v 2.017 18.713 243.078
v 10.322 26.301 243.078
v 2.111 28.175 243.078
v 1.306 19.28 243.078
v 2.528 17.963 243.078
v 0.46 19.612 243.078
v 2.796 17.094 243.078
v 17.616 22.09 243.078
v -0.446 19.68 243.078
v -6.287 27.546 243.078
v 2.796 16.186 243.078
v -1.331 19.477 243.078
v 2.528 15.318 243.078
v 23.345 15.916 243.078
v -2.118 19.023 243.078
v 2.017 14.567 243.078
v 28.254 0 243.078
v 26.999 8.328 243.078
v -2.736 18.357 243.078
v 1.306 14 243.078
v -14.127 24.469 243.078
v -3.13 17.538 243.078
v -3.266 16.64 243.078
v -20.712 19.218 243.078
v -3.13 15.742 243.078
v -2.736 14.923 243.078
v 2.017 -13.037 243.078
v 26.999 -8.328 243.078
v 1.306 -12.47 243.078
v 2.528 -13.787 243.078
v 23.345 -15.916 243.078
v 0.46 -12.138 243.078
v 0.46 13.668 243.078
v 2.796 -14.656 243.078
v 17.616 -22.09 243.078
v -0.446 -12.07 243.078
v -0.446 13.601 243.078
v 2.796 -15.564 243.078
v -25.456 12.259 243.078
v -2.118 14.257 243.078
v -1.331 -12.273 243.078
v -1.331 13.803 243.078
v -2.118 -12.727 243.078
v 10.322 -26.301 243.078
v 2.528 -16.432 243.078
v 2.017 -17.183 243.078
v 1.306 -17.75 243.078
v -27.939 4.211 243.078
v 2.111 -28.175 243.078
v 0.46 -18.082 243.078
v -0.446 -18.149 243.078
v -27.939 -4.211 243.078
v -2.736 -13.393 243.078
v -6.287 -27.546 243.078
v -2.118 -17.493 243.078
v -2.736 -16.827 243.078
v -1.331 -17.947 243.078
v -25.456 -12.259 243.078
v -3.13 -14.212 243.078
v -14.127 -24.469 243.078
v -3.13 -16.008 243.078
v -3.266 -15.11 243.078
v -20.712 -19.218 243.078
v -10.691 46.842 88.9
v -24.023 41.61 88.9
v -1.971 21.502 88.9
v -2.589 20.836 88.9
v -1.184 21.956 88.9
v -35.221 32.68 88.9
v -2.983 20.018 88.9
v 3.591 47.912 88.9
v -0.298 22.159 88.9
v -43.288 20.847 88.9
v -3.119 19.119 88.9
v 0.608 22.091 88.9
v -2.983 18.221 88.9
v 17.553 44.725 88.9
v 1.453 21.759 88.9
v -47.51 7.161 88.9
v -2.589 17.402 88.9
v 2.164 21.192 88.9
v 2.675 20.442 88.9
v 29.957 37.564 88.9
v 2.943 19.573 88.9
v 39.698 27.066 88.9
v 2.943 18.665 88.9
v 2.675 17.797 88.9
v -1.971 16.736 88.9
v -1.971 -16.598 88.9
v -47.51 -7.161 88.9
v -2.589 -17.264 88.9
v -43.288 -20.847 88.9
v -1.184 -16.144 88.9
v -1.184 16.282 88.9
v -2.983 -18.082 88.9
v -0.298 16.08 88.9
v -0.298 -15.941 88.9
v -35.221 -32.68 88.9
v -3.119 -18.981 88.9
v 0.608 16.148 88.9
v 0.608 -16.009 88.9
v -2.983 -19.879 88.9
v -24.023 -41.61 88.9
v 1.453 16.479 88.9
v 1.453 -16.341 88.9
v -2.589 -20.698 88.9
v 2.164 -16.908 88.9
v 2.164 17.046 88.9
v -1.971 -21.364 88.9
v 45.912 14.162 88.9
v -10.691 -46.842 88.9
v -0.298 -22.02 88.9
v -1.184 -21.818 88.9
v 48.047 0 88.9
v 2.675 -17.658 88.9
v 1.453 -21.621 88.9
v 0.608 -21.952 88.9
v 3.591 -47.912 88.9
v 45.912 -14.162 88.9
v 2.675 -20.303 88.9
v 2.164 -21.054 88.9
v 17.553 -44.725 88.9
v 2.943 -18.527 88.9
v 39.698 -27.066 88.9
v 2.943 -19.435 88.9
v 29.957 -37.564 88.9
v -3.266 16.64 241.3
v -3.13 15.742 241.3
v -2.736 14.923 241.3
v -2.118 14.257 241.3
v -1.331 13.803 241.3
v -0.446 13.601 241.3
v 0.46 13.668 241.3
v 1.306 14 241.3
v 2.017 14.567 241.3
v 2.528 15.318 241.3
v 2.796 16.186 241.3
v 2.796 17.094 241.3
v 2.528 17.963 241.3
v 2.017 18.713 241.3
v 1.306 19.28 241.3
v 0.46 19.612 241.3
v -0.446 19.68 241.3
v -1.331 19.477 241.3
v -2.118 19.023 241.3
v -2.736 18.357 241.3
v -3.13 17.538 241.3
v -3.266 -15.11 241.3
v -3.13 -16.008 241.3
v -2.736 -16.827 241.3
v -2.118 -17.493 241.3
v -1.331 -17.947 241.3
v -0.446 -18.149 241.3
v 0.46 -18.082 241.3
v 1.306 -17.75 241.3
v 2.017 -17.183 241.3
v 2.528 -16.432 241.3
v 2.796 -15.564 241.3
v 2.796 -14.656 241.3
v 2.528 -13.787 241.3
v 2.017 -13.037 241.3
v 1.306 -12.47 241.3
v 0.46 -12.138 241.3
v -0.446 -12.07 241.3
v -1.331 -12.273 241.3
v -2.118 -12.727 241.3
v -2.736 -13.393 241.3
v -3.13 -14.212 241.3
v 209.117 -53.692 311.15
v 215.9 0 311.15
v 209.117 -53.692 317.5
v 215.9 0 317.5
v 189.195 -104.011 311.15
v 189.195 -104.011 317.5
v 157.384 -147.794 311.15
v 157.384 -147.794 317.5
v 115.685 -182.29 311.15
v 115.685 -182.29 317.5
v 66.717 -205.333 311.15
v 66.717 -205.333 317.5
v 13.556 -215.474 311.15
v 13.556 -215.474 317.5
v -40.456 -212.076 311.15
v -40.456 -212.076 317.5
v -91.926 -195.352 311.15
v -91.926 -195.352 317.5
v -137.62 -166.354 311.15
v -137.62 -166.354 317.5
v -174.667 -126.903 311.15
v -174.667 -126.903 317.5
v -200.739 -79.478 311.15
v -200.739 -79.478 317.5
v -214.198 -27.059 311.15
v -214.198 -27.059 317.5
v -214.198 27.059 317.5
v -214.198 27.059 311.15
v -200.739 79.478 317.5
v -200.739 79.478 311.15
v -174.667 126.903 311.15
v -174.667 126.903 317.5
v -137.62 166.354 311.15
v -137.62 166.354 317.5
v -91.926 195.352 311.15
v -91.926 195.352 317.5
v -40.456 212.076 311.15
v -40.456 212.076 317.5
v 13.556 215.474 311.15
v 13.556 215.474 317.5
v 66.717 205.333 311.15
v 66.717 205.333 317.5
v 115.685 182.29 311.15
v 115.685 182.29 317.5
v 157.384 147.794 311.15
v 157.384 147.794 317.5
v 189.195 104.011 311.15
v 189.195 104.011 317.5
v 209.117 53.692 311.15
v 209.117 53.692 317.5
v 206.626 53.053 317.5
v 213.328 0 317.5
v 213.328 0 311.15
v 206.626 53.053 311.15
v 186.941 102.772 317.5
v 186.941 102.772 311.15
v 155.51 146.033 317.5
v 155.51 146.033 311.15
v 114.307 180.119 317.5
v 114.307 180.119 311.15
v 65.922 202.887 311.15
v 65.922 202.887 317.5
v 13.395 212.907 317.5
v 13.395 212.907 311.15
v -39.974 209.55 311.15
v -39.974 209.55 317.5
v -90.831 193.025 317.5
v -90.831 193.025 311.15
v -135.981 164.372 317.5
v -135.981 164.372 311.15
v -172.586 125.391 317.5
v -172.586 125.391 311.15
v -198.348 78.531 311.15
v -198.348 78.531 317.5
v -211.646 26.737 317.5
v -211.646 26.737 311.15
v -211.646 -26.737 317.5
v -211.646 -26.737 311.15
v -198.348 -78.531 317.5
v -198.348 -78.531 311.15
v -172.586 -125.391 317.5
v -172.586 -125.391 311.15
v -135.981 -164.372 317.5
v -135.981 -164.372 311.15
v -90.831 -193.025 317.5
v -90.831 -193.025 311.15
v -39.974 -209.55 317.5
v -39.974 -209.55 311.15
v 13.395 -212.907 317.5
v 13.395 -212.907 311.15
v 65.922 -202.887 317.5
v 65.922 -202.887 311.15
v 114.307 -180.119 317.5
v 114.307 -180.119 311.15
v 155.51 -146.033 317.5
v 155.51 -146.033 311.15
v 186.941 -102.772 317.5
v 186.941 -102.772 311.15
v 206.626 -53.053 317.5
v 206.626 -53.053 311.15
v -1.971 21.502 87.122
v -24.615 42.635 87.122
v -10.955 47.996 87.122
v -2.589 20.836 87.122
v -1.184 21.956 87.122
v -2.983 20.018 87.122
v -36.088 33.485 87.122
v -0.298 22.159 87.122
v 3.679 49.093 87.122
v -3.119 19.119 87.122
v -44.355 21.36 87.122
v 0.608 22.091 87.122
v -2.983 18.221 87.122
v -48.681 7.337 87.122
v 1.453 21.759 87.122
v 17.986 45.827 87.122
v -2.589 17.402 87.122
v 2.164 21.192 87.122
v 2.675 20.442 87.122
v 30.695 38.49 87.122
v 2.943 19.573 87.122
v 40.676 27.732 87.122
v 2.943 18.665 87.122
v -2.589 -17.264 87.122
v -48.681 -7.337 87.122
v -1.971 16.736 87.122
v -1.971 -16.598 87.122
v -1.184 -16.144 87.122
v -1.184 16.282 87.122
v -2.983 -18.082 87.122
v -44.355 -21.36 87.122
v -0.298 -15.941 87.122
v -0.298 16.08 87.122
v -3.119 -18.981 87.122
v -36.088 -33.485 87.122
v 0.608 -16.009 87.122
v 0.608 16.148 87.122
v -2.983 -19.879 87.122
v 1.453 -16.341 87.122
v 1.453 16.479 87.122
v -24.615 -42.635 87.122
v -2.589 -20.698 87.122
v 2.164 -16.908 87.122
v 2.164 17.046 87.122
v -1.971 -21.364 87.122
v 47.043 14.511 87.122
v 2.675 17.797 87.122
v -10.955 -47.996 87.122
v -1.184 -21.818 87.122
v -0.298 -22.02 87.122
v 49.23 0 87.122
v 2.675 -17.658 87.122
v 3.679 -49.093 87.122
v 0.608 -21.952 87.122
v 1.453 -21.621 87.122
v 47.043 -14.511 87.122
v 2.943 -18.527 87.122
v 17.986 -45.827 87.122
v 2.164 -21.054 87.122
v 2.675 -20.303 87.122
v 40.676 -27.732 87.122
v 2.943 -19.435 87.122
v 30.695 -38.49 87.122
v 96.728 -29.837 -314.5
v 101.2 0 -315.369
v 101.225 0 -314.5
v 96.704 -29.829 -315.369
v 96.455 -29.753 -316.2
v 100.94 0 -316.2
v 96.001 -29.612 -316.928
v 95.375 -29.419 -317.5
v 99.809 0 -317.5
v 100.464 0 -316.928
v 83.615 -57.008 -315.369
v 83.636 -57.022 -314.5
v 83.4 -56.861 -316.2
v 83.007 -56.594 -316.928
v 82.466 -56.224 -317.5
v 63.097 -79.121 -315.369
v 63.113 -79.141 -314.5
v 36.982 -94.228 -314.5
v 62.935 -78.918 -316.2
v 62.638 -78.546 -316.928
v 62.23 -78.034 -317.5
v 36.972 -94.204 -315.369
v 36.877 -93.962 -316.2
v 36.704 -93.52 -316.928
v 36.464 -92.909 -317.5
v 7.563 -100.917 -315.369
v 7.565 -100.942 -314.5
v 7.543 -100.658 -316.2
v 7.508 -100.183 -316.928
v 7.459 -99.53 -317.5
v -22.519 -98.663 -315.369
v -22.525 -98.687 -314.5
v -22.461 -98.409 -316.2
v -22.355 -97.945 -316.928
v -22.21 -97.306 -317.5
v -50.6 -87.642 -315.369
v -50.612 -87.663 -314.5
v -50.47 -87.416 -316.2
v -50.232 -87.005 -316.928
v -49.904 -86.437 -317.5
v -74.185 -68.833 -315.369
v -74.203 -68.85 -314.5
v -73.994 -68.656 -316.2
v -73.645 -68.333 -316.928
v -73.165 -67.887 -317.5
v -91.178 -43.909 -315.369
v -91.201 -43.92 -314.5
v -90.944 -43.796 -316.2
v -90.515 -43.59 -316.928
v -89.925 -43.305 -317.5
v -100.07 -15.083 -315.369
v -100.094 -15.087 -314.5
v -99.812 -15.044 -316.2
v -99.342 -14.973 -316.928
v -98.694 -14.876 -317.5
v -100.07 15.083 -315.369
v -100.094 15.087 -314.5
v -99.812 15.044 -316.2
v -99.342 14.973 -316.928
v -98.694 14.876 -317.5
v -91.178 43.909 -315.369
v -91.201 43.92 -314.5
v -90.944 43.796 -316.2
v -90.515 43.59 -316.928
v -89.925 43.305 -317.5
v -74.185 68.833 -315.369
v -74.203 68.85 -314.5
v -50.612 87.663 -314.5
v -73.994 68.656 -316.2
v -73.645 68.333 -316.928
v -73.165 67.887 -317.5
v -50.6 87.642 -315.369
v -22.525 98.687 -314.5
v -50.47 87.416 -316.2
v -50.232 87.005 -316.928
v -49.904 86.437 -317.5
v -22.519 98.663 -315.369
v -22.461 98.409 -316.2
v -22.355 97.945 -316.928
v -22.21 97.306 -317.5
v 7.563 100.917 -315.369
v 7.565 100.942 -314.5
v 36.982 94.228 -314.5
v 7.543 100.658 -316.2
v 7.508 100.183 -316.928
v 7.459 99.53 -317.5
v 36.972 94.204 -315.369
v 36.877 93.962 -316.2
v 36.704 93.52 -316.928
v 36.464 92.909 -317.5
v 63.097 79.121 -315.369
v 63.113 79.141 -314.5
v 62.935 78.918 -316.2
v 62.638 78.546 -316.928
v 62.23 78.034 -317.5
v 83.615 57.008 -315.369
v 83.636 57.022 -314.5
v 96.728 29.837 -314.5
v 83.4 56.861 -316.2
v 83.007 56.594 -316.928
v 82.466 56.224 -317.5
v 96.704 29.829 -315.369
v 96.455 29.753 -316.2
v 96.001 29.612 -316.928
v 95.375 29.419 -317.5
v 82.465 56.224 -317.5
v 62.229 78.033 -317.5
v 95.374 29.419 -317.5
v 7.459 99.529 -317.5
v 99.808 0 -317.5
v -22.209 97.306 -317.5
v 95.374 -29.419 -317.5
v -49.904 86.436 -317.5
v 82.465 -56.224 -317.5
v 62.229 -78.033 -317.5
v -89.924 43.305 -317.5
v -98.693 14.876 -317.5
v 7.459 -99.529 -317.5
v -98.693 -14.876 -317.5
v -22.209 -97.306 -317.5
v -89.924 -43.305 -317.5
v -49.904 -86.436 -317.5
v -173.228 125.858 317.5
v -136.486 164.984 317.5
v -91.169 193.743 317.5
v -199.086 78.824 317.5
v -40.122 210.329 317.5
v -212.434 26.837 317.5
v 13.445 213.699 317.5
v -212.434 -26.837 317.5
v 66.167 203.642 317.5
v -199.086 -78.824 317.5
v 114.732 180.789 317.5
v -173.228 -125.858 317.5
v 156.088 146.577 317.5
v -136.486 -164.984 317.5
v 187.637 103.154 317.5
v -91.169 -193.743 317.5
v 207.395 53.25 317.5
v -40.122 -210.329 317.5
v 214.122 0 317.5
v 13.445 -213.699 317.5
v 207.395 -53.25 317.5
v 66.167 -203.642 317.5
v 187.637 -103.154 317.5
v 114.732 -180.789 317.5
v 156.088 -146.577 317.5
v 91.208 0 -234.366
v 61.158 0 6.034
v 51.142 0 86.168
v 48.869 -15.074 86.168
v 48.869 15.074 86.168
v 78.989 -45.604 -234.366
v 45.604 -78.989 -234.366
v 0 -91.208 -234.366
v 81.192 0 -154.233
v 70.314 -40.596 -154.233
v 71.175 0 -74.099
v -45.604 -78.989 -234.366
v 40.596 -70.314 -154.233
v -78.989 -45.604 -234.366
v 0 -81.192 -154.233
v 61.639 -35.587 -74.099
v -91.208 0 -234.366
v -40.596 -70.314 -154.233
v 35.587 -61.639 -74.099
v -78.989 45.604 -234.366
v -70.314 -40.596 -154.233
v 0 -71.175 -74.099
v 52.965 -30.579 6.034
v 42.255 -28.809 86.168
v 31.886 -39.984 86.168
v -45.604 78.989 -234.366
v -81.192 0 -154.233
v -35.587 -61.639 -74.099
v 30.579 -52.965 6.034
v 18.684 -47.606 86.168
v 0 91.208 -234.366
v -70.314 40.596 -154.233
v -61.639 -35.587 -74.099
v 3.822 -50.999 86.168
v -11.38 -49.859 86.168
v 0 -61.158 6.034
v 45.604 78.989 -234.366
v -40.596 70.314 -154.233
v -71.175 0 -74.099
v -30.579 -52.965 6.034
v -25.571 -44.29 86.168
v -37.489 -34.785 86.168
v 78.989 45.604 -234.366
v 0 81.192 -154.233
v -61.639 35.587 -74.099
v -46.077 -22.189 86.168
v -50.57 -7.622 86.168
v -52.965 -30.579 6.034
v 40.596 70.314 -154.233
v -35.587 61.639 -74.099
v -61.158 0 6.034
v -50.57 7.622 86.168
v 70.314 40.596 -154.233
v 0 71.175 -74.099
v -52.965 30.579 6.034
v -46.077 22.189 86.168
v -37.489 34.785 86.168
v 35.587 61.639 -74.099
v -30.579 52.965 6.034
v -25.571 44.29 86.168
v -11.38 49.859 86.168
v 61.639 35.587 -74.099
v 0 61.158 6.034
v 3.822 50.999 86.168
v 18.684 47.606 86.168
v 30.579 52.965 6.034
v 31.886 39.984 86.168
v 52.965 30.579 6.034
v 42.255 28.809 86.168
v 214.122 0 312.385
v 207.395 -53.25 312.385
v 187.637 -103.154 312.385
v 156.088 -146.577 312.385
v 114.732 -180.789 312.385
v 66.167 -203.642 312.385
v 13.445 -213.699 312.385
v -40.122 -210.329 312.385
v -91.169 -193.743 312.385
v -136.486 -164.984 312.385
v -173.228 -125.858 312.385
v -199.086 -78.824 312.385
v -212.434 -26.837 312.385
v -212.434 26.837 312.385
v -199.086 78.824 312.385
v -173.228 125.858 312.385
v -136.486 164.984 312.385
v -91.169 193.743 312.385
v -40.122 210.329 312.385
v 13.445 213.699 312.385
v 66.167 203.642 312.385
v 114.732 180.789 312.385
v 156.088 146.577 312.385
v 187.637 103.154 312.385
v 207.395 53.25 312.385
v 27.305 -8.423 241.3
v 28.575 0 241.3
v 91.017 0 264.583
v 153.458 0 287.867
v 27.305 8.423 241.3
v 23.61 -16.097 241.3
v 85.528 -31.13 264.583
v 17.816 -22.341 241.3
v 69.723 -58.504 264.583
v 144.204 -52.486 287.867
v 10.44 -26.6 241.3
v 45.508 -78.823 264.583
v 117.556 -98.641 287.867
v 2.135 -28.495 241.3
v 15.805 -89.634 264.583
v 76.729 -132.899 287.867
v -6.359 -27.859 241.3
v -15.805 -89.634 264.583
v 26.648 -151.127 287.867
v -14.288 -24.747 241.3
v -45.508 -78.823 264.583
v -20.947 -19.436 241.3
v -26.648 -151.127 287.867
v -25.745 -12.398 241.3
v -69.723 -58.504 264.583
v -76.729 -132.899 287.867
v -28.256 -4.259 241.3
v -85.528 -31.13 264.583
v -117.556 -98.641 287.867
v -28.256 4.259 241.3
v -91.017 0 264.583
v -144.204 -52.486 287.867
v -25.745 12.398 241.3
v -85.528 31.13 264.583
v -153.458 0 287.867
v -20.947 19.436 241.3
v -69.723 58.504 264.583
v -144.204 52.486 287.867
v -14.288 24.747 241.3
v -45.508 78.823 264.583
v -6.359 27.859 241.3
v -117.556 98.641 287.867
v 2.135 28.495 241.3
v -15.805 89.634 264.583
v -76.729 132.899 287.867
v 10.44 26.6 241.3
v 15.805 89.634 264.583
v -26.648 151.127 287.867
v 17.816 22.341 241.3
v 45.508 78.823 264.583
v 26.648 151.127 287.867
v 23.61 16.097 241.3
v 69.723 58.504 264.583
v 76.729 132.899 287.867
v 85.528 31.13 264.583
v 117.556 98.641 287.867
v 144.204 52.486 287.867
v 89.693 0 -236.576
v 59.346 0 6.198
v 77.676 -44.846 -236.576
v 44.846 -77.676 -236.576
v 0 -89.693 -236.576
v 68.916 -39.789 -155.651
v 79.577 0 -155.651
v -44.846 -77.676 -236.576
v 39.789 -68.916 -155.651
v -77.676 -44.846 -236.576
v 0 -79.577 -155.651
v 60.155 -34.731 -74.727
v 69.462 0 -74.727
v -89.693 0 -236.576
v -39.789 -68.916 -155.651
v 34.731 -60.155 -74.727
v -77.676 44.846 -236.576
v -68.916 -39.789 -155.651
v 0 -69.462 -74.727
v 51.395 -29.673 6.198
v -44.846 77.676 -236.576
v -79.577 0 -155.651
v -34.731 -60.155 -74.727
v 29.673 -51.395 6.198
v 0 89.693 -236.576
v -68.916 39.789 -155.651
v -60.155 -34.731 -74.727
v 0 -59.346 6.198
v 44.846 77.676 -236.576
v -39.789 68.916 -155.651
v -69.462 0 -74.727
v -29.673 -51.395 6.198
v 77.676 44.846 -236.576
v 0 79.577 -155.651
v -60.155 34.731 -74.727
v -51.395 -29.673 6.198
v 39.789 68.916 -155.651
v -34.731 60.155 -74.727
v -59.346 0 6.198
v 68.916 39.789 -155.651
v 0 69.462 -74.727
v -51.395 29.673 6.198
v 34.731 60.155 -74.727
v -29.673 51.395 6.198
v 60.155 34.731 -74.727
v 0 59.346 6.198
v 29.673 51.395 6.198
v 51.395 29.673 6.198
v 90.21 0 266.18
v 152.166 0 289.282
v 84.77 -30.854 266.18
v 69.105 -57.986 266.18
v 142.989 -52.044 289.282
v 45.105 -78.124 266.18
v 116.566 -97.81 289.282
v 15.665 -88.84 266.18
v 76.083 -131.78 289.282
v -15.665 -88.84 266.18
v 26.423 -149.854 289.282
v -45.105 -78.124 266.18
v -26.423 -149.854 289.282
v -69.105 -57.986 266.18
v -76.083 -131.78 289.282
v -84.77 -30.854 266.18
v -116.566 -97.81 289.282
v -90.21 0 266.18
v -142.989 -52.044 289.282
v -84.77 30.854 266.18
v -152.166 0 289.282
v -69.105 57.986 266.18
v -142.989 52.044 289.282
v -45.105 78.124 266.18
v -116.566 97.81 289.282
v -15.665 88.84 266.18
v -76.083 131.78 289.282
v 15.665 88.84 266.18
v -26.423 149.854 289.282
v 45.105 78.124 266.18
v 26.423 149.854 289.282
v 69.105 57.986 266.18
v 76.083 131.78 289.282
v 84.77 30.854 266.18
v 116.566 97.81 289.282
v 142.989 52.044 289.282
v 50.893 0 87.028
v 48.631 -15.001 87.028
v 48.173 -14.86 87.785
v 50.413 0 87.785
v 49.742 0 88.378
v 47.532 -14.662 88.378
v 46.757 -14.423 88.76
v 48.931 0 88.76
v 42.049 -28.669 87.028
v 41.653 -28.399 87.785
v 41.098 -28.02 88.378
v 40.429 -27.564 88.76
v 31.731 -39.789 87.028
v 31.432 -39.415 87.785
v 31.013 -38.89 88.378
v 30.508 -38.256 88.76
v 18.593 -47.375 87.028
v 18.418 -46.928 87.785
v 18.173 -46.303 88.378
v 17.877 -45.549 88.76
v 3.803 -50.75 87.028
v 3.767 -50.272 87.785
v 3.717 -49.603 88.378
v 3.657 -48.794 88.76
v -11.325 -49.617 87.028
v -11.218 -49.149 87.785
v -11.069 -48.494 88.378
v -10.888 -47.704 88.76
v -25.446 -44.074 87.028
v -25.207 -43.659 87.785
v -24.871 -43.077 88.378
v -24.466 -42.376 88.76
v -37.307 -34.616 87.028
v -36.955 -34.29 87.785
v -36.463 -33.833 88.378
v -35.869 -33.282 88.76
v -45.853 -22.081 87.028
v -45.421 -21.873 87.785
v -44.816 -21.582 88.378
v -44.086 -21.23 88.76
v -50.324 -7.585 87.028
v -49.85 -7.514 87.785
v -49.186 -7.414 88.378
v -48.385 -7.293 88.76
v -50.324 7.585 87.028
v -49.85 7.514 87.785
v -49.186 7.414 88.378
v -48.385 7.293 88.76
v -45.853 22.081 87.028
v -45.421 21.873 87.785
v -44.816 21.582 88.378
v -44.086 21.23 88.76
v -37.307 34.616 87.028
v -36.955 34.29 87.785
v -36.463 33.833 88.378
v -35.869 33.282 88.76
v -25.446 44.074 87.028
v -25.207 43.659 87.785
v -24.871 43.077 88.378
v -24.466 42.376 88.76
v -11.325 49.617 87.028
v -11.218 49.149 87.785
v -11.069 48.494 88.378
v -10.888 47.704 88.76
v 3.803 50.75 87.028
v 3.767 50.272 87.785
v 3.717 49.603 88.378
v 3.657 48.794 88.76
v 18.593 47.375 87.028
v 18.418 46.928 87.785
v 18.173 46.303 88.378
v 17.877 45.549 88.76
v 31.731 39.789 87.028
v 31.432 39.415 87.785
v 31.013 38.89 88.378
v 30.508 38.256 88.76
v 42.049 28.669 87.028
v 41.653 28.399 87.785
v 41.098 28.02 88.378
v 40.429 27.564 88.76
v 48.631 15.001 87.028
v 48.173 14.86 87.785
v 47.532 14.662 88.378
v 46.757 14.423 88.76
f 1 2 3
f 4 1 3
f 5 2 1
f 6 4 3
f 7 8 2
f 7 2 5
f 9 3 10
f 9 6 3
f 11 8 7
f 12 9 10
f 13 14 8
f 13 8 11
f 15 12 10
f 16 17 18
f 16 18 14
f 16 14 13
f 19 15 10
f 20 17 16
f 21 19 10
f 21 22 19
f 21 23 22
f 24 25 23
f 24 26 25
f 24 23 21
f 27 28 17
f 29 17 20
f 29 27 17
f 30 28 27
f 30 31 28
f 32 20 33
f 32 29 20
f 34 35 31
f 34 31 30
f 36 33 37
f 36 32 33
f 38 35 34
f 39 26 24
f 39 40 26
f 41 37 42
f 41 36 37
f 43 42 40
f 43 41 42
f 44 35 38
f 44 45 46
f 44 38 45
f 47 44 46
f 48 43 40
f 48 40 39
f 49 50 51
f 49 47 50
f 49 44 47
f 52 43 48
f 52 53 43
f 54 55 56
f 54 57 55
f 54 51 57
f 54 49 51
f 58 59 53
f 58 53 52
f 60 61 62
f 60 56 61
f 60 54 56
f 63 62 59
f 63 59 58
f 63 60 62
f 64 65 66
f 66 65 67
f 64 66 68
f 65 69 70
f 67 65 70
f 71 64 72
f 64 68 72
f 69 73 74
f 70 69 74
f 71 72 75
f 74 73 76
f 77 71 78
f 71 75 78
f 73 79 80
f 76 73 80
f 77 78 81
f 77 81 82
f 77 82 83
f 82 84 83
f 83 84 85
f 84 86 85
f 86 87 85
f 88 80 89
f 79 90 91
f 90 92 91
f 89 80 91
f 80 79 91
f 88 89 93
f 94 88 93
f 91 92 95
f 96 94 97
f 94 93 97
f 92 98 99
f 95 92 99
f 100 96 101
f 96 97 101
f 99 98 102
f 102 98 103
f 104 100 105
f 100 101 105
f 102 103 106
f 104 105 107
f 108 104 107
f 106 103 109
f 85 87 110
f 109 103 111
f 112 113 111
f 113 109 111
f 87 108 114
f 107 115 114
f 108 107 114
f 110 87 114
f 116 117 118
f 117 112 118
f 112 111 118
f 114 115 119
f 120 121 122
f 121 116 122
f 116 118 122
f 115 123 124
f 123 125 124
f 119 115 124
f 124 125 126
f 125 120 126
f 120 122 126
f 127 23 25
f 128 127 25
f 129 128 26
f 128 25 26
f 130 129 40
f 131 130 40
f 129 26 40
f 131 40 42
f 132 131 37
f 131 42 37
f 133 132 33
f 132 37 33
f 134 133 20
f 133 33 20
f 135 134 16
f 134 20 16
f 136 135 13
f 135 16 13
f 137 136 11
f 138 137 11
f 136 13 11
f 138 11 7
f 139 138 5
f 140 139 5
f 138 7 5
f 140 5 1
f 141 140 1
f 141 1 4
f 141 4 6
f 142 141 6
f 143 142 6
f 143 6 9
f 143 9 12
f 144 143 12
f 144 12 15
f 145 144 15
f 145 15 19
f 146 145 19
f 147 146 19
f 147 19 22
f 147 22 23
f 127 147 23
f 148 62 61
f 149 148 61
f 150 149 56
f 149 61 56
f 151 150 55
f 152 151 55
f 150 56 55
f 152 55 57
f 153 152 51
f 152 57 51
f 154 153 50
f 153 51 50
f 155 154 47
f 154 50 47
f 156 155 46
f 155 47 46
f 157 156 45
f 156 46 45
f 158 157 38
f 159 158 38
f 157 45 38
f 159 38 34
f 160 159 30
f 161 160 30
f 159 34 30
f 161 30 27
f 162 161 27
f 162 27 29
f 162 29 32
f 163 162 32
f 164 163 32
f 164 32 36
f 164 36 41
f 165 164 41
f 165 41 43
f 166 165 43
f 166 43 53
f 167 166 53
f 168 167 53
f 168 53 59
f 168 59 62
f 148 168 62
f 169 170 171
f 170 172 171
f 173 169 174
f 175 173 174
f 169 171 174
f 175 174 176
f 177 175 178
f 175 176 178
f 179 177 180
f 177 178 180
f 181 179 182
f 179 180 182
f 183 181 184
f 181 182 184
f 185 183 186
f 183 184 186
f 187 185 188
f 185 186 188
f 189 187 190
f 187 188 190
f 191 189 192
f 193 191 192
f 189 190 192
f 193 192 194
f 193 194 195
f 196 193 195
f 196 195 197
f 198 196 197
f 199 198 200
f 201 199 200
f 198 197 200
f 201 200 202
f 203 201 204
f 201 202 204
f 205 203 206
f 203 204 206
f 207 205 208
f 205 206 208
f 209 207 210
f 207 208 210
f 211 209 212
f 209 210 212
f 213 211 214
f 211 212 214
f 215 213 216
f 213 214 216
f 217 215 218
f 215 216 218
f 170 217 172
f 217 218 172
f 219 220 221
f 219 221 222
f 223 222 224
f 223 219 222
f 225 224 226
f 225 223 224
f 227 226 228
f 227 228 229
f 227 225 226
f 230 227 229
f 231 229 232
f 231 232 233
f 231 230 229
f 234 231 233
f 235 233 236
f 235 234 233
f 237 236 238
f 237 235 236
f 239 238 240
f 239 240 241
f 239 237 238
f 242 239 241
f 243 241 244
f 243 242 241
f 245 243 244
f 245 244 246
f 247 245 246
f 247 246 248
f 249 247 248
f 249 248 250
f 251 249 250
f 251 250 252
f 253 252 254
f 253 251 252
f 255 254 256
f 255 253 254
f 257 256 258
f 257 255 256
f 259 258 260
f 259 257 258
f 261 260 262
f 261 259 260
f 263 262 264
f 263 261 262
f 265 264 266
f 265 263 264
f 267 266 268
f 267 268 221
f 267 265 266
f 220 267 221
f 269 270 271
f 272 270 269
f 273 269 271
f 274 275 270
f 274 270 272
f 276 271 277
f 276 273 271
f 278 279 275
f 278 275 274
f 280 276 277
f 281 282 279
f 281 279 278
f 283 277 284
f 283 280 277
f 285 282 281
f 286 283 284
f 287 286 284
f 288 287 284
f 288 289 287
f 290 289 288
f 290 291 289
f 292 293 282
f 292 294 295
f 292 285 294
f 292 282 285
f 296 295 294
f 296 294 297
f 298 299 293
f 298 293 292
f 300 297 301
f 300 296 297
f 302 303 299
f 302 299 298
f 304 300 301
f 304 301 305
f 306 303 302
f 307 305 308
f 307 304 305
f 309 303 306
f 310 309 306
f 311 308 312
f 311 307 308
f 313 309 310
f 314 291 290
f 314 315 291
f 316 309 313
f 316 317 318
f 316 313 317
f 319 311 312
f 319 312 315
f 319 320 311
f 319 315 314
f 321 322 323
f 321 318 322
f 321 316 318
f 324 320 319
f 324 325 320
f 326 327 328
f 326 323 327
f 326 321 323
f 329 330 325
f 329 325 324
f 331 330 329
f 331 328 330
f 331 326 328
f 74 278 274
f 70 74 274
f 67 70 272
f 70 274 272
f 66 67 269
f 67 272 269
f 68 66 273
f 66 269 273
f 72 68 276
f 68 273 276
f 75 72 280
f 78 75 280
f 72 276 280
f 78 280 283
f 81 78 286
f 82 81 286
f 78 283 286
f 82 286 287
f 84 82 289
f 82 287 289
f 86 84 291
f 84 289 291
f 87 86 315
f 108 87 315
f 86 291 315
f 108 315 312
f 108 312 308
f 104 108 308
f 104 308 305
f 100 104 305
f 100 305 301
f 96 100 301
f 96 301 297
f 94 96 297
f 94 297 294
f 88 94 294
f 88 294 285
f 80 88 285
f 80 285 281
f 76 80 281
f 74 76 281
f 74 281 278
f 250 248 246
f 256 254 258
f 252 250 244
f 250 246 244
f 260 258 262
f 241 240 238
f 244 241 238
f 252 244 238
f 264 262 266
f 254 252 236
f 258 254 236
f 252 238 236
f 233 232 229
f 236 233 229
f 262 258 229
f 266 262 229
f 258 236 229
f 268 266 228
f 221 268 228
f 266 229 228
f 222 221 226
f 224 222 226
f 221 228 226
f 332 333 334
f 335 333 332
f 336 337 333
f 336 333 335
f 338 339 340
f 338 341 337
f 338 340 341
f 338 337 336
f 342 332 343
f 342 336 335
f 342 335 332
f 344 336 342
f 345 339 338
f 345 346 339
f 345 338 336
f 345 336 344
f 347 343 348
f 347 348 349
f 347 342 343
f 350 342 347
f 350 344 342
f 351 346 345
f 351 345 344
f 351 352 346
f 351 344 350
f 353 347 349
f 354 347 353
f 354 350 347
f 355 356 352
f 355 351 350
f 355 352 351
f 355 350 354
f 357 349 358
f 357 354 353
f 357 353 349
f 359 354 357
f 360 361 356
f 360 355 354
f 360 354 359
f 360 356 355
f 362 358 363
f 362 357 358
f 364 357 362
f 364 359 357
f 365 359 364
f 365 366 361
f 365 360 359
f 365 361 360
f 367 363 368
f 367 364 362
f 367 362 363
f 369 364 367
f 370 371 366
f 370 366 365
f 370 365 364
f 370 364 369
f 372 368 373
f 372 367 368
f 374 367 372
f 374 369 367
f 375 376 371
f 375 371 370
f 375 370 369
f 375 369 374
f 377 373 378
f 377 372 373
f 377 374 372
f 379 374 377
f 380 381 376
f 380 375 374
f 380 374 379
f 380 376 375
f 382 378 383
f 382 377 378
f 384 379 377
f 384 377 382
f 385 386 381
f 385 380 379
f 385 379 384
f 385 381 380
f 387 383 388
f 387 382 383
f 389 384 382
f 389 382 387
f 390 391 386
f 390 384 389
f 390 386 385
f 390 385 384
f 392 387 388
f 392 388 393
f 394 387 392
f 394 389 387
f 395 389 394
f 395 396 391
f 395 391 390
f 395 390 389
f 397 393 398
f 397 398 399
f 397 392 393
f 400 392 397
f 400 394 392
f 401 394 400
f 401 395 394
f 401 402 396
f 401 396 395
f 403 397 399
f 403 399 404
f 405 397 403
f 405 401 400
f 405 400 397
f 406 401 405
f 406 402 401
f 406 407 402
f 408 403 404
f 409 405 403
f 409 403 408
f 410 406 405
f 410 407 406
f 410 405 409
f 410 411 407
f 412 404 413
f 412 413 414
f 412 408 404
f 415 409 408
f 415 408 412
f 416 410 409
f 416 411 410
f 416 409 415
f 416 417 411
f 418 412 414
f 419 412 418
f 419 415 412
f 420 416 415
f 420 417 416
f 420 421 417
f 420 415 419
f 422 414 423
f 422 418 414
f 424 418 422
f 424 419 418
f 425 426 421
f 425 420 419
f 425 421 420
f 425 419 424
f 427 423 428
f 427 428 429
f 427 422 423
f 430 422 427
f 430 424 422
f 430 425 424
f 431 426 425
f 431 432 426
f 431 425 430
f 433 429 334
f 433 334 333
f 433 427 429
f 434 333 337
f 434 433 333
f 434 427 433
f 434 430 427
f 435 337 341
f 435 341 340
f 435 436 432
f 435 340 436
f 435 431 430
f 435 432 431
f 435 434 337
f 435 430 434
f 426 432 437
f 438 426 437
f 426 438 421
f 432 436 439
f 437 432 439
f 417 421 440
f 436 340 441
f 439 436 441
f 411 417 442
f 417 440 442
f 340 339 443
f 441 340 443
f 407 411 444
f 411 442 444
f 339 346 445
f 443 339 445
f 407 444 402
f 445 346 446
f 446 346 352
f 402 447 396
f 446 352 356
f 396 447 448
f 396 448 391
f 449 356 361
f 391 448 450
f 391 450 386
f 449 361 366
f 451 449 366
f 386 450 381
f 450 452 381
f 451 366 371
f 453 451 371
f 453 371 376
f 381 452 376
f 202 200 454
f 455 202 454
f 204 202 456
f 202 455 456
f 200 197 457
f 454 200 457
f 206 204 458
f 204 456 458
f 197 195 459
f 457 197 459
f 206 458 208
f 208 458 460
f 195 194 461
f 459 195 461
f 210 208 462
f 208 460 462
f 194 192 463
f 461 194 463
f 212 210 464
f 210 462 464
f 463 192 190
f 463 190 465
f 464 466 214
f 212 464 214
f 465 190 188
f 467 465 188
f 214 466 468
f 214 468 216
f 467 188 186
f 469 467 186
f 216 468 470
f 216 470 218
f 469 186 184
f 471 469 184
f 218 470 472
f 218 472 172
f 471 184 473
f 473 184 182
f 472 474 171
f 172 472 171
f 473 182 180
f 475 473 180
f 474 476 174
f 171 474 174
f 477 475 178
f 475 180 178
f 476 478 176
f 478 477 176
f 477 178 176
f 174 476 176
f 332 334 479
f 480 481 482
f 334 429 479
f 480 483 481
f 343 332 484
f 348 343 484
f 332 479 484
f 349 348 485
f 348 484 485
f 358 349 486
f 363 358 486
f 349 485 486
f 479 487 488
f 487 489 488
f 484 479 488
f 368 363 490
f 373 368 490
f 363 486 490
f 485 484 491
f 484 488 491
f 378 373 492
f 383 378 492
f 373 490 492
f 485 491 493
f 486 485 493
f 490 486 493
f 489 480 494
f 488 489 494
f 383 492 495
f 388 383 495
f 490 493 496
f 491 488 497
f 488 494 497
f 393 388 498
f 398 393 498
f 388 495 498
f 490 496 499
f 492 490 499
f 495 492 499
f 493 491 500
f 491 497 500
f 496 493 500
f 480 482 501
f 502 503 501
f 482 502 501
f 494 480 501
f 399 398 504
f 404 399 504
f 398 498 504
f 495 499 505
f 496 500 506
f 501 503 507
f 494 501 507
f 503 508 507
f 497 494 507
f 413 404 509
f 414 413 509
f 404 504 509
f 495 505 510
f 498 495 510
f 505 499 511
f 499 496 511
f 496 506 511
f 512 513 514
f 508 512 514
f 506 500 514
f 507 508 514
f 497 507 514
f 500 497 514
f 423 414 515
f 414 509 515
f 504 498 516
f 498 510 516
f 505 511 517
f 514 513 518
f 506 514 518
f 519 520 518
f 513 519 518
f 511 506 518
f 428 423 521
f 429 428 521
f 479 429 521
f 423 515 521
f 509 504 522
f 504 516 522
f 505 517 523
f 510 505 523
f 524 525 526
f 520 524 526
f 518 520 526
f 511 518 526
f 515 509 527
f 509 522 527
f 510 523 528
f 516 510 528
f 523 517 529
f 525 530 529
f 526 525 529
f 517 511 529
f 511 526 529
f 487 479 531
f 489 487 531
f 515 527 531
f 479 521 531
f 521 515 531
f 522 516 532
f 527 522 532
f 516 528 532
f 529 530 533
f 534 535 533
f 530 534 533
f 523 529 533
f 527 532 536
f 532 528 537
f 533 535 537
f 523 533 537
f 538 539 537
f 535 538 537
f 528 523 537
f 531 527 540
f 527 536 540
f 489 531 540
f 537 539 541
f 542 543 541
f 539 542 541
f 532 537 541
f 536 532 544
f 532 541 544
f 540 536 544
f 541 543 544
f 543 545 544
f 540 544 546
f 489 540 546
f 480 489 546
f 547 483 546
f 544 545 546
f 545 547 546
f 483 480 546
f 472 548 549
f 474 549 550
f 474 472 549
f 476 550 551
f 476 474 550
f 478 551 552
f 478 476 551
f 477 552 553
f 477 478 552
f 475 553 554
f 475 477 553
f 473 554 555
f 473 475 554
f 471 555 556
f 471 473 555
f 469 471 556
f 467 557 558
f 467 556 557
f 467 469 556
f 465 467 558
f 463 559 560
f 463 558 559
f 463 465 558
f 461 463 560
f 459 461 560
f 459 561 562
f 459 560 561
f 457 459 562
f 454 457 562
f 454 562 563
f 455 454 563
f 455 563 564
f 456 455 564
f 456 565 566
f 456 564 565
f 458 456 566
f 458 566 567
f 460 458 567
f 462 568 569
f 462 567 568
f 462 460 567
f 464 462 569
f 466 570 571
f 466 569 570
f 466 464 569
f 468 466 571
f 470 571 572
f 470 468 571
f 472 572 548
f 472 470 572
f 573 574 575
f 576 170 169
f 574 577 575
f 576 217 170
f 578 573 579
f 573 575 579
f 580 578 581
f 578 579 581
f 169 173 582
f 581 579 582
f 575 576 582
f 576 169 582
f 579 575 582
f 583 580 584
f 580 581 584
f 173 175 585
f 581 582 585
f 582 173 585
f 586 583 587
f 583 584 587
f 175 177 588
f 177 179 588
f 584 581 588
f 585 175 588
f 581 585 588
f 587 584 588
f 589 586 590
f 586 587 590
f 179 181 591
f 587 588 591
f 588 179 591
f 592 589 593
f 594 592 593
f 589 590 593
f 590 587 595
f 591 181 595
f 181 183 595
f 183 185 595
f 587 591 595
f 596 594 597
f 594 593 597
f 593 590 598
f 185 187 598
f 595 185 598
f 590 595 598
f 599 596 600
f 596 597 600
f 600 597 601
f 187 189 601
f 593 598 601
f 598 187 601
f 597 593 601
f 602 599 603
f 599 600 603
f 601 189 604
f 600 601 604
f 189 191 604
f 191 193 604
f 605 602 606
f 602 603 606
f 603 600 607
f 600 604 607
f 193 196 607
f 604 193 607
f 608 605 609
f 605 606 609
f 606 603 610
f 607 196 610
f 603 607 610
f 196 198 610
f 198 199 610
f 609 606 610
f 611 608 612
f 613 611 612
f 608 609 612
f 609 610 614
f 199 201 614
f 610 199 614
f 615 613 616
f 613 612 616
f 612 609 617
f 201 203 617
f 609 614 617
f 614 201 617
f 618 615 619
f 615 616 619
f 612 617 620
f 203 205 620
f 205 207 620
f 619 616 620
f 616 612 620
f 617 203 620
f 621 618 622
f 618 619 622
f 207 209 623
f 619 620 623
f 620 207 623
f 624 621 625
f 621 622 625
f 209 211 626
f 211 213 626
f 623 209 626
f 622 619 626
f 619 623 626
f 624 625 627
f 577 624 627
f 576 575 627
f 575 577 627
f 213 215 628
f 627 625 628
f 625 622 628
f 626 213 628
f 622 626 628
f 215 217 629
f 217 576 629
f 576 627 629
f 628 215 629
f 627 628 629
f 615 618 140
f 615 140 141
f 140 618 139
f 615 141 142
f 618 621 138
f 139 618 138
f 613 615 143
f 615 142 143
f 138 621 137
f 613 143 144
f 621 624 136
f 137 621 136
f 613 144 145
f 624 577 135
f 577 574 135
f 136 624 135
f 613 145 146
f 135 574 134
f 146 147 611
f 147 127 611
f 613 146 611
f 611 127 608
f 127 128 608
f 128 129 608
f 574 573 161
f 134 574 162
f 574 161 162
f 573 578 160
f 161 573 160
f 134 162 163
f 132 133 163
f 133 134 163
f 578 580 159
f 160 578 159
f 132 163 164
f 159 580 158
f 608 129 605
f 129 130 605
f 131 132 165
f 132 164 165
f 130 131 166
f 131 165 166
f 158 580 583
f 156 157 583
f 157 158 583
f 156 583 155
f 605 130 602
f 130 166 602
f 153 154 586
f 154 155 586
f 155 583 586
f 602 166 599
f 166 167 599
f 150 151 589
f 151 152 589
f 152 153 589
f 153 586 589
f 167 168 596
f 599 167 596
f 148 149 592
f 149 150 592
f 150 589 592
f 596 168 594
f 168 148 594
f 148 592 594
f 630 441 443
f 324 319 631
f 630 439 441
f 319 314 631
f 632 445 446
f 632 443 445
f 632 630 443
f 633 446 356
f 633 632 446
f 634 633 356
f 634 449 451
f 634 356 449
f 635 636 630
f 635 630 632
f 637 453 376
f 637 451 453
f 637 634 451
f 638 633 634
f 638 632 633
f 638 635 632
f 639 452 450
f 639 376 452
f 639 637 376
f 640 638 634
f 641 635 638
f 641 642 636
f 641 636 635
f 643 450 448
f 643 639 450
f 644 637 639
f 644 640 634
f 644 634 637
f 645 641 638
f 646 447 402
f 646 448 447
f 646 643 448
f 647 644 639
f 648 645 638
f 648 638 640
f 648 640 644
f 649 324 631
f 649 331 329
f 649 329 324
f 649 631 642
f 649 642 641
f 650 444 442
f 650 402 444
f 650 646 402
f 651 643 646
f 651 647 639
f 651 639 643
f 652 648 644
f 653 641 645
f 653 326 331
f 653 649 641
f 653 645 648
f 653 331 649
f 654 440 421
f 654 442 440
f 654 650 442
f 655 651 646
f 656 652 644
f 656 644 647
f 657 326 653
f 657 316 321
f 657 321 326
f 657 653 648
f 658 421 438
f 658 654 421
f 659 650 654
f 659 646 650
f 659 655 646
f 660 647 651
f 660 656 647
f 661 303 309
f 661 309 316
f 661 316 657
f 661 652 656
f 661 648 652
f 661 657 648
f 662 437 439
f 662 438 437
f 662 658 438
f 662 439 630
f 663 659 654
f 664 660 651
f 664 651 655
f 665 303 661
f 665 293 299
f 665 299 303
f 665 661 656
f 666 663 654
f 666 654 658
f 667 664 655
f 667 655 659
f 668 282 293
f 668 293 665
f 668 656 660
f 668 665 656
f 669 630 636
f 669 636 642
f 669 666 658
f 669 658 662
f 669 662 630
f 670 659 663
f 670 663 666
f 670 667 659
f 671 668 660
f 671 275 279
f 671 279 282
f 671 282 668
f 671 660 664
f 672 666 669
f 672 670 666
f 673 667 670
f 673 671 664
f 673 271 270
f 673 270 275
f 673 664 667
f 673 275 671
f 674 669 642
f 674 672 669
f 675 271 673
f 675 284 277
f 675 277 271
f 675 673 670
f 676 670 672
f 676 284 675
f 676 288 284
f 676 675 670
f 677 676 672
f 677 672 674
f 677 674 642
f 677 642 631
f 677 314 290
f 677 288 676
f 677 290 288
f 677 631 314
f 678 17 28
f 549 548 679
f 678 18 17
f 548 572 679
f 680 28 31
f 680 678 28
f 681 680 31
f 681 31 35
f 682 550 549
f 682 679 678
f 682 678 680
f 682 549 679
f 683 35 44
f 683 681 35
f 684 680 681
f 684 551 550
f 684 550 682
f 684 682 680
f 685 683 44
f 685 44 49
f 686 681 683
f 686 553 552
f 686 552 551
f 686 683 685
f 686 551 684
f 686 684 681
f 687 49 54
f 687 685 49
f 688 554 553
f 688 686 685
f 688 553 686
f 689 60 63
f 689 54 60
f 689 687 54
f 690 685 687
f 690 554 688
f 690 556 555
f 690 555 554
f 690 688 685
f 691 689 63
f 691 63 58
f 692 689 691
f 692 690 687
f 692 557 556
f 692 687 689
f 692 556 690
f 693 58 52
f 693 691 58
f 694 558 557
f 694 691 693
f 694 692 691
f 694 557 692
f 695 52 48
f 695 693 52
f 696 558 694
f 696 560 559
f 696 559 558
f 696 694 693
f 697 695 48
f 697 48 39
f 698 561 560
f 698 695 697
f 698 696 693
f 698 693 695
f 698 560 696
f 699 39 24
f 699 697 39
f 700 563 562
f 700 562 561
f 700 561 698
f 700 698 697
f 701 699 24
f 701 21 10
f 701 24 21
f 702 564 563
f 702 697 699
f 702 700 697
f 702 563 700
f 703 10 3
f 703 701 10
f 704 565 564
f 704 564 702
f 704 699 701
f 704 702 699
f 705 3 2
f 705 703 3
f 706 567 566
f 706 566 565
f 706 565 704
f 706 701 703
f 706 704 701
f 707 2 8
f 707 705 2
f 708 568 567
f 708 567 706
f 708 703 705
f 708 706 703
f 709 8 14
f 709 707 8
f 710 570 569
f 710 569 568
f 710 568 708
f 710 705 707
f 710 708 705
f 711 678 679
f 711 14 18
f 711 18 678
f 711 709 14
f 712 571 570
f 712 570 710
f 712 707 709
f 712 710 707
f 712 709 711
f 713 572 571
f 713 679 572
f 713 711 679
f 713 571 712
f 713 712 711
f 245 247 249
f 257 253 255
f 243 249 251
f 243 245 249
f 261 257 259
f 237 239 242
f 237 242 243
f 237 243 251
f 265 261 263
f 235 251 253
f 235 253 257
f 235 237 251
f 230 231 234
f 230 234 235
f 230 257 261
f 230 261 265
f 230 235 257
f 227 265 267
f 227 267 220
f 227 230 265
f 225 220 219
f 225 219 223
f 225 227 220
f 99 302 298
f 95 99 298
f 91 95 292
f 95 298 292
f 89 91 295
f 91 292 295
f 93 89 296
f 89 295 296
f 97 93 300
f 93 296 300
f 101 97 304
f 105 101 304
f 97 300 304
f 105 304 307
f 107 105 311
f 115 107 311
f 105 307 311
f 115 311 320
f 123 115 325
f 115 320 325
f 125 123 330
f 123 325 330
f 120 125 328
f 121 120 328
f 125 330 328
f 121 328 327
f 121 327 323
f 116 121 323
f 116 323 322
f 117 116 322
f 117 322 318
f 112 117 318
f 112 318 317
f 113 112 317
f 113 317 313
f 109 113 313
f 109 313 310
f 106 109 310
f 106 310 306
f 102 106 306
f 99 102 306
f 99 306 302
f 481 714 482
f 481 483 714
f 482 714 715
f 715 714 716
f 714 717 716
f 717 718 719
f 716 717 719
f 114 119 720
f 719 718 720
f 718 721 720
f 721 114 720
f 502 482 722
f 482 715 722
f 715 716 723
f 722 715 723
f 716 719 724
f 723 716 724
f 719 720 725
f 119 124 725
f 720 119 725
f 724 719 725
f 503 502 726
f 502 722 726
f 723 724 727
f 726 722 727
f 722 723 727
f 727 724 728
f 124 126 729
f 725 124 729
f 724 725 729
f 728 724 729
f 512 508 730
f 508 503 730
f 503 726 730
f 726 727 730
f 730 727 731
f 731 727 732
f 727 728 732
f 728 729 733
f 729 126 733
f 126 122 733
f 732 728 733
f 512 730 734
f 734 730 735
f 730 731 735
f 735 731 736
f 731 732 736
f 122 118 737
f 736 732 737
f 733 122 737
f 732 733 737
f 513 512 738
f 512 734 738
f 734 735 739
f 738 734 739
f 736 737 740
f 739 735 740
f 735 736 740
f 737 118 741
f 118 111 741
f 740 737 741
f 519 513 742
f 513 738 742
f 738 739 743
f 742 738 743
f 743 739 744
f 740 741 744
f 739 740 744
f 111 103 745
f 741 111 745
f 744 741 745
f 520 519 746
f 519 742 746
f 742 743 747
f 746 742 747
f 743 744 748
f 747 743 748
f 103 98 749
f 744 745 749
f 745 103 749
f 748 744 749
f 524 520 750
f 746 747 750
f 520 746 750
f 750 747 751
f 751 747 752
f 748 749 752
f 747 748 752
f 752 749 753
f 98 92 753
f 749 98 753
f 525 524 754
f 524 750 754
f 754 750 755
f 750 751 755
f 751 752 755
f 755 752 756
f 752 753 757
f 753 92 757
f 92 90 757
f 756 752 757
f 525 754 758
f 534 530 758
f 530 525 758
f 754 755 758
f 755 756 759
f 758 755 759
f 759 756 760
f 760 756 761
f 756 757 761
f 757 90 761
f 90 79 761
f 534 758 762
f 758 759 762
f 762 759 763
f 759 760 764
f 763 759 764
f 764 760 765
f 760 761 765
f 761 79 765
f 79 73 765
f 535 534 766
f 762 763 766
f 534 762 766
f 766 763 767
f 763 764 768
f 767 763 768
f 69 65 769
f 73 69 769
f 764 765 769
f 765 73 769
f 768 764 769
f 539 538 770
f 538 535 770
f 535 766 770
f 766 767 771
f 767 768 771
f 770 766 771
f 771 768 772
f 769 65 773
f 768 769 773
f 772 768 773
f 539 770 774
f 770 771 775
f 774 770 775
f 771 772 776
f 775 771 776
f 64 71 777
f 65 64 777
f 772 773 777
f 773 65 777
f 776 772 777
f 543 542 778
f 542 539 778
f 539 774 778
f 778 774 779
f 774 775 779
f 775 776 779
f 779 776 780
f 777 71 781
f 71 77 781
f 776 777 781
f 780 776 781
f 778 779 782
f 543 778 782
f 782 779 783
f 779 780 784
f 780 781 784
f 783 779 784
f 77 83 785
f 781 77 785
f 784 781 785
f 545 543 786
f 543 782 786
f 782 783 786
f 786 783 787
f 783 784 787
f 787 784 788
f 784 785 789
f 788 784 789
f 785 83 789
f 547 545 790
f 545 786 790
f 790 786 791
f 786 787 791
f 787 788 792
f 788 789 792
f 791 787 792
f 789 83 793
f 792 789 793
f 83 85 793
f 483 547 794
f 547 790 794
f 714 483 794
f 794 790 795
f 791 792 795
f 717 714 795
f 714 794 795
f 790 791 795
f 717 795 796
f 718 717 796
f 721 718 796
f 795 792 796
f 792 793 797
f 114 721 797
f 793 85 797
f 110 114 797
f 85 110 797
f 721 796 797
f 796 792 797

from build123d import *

# Parameters (mm, degrees)
F2_T      = -1.778
F3_T      = -1.778
F4_R      = 213.32825
F5_DEPTH  = 6.35
F8_D      = 6.096
F8_DEPTH  = 5.08
F8_TIP    = 1.8314231668
F10_D     = 6.096
F10_DEPTH = 5.08
F10_TIP   = 1.8314231668


# Not quite as in the source:
# - a fillet or chamfer that OpenCascade refuses, or shapes differently, is made with other operations: its cross-section is extruded or revolved along the edge and cut away or added


with BuildPart() as f1:
    # F0 (on Front) → F1 (revolve)
    with BuildSketch(Plane.XZ):
        Polygon((215.9, 311.15), (215.9, 317.5), (0, 317.5), (0, 241.3), (25.4, 241.3), (28.575, 241.3), align=None)
    revolve(axis=Axis((0, 0, 279.4), (0, 0, -1)))

    # F3
    f3_openings = [f1.faces().sort_by_distance(p)[0] for p in [
        (0, 0, 317.5),
    ]]
    offset(amount=F3_T, openings=f3_openings)

    # F8
    with Locations(Plane(origin=(0, 0, 241.3), x_dir=(1, 0, 0), z_dir=(0, 0, -1))):
        with Locations((-0.2177452552, 15.1099245586), (-0.2177452552, -16.6400754414)):
            Hole(F8_D / 2, depth=F8_DEPTH)
            with Locations((0, 0, -(F8_DEPTH + F8_TIP / 2))):  # 118° drill point
                Cone(0, F8_D / 2, F8_TIP, mode=Mode.SUBTRACT)


with BuildPart() as f1b:
    # F0 (on Front) → F1, piece 2 (revolve)
    with BuildSketch(Plane.XZ):
        Polygon((0, 88.9), (0, -317.5), (101.6, -317.5), (50.8, 88.9), (38.1, 88.9), align=None)
    revolve(axis=Axis((0, 0, 279.4), (0, 0, -1)))

    # F2
    f2_openings = [f1b.faces().sort_by_distance(p)[0] for p in [
        (0, 0, -317.5),
    ]]
    offset(amount=F2_T, openings=f2_openings)

    # F6: fillet of radius 3.175 on 2 edges, made by hand

    # F6_s1 → F6_t2 (revolve, cut)
    with BuildSketch(Plane.XZ):
        with BuildLine():
            ThreePointArc((51.1481767954, 86.1178105398), (50.0983895944, 88.1052282082), (47.9961089334, 88.9004))
            Line((47.9961089334, 88.9004), (47.9961089334, 89.2180597943))
            ThreePointArc((47.9961089334, 89.2180597943), (49.3980544667, 89.2176597943), (50.8, 89.2176597943))
            Line((50.8, 89.2176597943), (51.1152067862, 88.9394008483))
            ThreePointArc((51.1152067862, 88.9394008483), (51.2890967283, 87.5482813112), (51.4633835816, 86.1572113881))
            Line((51.4633835816, 86.1572113881), (51.1481767954, 86.1178105398))
        make_face()
    revolve(axis=Axis((0, 0, 88.9), (0, 0, -1)), mode=Mode.SUBTRACT)

    # F6_s3 → F6_t4 (revolve, cut)
    with BuildSketch(Plane.XZ):
        with BuildLine():
            ThreePointArc((101.2191288957, -314.4498062625), (100.9503066223, -316.1769576353), (99.8083824609, -317.5003345615))
            Line((99.8083824609, -317.5003345615), (99.9824734041, -317.7659916931))
            ThreePointArc((99.9824734041, -317.7659916931), (100.7041912305, -317.8176182741), (101.6, -317.8176182741))
            Line((101.6, -317.8176182741), (101.9151655866, -317.4606043017))
            ThreePointArc((101.9151655866, -317.4606043017), (101.7245315789, -315.9355322399), (101.5342944823, -314.4104105642))
            Line((101.5342944823, -314.4104105642), (101.2191288957, -314.4498062625))
        make_face()
    revolve(axis=Axis((0, 0, -317.5), (0, 0, -1)), mode=Mode.SUBTRACT)

    # F10
    with Locations(Plane.XY.offset(88.9)):
        with Locations((-0.0706888968, -18.9808944534), (-0.0706888968, 19.1191055466)):
            Hole(F10_D / 2, depth=F10_DEPTH)
            with Locations((0, 0, -(F10_DEPTH + F10_TIP / 2))):  # 118° drill point
                Cone(0, F10_D / 2, F10_TIP, mode=Mode.SUBTRACT)


with BuildPart() as f5:
    # F4 (on face) → F5 (new body)
    with BuildSketch(Plane.XY.offset(317.5)):
        Circle(F4_R)
    extrude(amount=-F5_DEPTH)


solid = Compound([f1.part, f1b.part, f5.part])
